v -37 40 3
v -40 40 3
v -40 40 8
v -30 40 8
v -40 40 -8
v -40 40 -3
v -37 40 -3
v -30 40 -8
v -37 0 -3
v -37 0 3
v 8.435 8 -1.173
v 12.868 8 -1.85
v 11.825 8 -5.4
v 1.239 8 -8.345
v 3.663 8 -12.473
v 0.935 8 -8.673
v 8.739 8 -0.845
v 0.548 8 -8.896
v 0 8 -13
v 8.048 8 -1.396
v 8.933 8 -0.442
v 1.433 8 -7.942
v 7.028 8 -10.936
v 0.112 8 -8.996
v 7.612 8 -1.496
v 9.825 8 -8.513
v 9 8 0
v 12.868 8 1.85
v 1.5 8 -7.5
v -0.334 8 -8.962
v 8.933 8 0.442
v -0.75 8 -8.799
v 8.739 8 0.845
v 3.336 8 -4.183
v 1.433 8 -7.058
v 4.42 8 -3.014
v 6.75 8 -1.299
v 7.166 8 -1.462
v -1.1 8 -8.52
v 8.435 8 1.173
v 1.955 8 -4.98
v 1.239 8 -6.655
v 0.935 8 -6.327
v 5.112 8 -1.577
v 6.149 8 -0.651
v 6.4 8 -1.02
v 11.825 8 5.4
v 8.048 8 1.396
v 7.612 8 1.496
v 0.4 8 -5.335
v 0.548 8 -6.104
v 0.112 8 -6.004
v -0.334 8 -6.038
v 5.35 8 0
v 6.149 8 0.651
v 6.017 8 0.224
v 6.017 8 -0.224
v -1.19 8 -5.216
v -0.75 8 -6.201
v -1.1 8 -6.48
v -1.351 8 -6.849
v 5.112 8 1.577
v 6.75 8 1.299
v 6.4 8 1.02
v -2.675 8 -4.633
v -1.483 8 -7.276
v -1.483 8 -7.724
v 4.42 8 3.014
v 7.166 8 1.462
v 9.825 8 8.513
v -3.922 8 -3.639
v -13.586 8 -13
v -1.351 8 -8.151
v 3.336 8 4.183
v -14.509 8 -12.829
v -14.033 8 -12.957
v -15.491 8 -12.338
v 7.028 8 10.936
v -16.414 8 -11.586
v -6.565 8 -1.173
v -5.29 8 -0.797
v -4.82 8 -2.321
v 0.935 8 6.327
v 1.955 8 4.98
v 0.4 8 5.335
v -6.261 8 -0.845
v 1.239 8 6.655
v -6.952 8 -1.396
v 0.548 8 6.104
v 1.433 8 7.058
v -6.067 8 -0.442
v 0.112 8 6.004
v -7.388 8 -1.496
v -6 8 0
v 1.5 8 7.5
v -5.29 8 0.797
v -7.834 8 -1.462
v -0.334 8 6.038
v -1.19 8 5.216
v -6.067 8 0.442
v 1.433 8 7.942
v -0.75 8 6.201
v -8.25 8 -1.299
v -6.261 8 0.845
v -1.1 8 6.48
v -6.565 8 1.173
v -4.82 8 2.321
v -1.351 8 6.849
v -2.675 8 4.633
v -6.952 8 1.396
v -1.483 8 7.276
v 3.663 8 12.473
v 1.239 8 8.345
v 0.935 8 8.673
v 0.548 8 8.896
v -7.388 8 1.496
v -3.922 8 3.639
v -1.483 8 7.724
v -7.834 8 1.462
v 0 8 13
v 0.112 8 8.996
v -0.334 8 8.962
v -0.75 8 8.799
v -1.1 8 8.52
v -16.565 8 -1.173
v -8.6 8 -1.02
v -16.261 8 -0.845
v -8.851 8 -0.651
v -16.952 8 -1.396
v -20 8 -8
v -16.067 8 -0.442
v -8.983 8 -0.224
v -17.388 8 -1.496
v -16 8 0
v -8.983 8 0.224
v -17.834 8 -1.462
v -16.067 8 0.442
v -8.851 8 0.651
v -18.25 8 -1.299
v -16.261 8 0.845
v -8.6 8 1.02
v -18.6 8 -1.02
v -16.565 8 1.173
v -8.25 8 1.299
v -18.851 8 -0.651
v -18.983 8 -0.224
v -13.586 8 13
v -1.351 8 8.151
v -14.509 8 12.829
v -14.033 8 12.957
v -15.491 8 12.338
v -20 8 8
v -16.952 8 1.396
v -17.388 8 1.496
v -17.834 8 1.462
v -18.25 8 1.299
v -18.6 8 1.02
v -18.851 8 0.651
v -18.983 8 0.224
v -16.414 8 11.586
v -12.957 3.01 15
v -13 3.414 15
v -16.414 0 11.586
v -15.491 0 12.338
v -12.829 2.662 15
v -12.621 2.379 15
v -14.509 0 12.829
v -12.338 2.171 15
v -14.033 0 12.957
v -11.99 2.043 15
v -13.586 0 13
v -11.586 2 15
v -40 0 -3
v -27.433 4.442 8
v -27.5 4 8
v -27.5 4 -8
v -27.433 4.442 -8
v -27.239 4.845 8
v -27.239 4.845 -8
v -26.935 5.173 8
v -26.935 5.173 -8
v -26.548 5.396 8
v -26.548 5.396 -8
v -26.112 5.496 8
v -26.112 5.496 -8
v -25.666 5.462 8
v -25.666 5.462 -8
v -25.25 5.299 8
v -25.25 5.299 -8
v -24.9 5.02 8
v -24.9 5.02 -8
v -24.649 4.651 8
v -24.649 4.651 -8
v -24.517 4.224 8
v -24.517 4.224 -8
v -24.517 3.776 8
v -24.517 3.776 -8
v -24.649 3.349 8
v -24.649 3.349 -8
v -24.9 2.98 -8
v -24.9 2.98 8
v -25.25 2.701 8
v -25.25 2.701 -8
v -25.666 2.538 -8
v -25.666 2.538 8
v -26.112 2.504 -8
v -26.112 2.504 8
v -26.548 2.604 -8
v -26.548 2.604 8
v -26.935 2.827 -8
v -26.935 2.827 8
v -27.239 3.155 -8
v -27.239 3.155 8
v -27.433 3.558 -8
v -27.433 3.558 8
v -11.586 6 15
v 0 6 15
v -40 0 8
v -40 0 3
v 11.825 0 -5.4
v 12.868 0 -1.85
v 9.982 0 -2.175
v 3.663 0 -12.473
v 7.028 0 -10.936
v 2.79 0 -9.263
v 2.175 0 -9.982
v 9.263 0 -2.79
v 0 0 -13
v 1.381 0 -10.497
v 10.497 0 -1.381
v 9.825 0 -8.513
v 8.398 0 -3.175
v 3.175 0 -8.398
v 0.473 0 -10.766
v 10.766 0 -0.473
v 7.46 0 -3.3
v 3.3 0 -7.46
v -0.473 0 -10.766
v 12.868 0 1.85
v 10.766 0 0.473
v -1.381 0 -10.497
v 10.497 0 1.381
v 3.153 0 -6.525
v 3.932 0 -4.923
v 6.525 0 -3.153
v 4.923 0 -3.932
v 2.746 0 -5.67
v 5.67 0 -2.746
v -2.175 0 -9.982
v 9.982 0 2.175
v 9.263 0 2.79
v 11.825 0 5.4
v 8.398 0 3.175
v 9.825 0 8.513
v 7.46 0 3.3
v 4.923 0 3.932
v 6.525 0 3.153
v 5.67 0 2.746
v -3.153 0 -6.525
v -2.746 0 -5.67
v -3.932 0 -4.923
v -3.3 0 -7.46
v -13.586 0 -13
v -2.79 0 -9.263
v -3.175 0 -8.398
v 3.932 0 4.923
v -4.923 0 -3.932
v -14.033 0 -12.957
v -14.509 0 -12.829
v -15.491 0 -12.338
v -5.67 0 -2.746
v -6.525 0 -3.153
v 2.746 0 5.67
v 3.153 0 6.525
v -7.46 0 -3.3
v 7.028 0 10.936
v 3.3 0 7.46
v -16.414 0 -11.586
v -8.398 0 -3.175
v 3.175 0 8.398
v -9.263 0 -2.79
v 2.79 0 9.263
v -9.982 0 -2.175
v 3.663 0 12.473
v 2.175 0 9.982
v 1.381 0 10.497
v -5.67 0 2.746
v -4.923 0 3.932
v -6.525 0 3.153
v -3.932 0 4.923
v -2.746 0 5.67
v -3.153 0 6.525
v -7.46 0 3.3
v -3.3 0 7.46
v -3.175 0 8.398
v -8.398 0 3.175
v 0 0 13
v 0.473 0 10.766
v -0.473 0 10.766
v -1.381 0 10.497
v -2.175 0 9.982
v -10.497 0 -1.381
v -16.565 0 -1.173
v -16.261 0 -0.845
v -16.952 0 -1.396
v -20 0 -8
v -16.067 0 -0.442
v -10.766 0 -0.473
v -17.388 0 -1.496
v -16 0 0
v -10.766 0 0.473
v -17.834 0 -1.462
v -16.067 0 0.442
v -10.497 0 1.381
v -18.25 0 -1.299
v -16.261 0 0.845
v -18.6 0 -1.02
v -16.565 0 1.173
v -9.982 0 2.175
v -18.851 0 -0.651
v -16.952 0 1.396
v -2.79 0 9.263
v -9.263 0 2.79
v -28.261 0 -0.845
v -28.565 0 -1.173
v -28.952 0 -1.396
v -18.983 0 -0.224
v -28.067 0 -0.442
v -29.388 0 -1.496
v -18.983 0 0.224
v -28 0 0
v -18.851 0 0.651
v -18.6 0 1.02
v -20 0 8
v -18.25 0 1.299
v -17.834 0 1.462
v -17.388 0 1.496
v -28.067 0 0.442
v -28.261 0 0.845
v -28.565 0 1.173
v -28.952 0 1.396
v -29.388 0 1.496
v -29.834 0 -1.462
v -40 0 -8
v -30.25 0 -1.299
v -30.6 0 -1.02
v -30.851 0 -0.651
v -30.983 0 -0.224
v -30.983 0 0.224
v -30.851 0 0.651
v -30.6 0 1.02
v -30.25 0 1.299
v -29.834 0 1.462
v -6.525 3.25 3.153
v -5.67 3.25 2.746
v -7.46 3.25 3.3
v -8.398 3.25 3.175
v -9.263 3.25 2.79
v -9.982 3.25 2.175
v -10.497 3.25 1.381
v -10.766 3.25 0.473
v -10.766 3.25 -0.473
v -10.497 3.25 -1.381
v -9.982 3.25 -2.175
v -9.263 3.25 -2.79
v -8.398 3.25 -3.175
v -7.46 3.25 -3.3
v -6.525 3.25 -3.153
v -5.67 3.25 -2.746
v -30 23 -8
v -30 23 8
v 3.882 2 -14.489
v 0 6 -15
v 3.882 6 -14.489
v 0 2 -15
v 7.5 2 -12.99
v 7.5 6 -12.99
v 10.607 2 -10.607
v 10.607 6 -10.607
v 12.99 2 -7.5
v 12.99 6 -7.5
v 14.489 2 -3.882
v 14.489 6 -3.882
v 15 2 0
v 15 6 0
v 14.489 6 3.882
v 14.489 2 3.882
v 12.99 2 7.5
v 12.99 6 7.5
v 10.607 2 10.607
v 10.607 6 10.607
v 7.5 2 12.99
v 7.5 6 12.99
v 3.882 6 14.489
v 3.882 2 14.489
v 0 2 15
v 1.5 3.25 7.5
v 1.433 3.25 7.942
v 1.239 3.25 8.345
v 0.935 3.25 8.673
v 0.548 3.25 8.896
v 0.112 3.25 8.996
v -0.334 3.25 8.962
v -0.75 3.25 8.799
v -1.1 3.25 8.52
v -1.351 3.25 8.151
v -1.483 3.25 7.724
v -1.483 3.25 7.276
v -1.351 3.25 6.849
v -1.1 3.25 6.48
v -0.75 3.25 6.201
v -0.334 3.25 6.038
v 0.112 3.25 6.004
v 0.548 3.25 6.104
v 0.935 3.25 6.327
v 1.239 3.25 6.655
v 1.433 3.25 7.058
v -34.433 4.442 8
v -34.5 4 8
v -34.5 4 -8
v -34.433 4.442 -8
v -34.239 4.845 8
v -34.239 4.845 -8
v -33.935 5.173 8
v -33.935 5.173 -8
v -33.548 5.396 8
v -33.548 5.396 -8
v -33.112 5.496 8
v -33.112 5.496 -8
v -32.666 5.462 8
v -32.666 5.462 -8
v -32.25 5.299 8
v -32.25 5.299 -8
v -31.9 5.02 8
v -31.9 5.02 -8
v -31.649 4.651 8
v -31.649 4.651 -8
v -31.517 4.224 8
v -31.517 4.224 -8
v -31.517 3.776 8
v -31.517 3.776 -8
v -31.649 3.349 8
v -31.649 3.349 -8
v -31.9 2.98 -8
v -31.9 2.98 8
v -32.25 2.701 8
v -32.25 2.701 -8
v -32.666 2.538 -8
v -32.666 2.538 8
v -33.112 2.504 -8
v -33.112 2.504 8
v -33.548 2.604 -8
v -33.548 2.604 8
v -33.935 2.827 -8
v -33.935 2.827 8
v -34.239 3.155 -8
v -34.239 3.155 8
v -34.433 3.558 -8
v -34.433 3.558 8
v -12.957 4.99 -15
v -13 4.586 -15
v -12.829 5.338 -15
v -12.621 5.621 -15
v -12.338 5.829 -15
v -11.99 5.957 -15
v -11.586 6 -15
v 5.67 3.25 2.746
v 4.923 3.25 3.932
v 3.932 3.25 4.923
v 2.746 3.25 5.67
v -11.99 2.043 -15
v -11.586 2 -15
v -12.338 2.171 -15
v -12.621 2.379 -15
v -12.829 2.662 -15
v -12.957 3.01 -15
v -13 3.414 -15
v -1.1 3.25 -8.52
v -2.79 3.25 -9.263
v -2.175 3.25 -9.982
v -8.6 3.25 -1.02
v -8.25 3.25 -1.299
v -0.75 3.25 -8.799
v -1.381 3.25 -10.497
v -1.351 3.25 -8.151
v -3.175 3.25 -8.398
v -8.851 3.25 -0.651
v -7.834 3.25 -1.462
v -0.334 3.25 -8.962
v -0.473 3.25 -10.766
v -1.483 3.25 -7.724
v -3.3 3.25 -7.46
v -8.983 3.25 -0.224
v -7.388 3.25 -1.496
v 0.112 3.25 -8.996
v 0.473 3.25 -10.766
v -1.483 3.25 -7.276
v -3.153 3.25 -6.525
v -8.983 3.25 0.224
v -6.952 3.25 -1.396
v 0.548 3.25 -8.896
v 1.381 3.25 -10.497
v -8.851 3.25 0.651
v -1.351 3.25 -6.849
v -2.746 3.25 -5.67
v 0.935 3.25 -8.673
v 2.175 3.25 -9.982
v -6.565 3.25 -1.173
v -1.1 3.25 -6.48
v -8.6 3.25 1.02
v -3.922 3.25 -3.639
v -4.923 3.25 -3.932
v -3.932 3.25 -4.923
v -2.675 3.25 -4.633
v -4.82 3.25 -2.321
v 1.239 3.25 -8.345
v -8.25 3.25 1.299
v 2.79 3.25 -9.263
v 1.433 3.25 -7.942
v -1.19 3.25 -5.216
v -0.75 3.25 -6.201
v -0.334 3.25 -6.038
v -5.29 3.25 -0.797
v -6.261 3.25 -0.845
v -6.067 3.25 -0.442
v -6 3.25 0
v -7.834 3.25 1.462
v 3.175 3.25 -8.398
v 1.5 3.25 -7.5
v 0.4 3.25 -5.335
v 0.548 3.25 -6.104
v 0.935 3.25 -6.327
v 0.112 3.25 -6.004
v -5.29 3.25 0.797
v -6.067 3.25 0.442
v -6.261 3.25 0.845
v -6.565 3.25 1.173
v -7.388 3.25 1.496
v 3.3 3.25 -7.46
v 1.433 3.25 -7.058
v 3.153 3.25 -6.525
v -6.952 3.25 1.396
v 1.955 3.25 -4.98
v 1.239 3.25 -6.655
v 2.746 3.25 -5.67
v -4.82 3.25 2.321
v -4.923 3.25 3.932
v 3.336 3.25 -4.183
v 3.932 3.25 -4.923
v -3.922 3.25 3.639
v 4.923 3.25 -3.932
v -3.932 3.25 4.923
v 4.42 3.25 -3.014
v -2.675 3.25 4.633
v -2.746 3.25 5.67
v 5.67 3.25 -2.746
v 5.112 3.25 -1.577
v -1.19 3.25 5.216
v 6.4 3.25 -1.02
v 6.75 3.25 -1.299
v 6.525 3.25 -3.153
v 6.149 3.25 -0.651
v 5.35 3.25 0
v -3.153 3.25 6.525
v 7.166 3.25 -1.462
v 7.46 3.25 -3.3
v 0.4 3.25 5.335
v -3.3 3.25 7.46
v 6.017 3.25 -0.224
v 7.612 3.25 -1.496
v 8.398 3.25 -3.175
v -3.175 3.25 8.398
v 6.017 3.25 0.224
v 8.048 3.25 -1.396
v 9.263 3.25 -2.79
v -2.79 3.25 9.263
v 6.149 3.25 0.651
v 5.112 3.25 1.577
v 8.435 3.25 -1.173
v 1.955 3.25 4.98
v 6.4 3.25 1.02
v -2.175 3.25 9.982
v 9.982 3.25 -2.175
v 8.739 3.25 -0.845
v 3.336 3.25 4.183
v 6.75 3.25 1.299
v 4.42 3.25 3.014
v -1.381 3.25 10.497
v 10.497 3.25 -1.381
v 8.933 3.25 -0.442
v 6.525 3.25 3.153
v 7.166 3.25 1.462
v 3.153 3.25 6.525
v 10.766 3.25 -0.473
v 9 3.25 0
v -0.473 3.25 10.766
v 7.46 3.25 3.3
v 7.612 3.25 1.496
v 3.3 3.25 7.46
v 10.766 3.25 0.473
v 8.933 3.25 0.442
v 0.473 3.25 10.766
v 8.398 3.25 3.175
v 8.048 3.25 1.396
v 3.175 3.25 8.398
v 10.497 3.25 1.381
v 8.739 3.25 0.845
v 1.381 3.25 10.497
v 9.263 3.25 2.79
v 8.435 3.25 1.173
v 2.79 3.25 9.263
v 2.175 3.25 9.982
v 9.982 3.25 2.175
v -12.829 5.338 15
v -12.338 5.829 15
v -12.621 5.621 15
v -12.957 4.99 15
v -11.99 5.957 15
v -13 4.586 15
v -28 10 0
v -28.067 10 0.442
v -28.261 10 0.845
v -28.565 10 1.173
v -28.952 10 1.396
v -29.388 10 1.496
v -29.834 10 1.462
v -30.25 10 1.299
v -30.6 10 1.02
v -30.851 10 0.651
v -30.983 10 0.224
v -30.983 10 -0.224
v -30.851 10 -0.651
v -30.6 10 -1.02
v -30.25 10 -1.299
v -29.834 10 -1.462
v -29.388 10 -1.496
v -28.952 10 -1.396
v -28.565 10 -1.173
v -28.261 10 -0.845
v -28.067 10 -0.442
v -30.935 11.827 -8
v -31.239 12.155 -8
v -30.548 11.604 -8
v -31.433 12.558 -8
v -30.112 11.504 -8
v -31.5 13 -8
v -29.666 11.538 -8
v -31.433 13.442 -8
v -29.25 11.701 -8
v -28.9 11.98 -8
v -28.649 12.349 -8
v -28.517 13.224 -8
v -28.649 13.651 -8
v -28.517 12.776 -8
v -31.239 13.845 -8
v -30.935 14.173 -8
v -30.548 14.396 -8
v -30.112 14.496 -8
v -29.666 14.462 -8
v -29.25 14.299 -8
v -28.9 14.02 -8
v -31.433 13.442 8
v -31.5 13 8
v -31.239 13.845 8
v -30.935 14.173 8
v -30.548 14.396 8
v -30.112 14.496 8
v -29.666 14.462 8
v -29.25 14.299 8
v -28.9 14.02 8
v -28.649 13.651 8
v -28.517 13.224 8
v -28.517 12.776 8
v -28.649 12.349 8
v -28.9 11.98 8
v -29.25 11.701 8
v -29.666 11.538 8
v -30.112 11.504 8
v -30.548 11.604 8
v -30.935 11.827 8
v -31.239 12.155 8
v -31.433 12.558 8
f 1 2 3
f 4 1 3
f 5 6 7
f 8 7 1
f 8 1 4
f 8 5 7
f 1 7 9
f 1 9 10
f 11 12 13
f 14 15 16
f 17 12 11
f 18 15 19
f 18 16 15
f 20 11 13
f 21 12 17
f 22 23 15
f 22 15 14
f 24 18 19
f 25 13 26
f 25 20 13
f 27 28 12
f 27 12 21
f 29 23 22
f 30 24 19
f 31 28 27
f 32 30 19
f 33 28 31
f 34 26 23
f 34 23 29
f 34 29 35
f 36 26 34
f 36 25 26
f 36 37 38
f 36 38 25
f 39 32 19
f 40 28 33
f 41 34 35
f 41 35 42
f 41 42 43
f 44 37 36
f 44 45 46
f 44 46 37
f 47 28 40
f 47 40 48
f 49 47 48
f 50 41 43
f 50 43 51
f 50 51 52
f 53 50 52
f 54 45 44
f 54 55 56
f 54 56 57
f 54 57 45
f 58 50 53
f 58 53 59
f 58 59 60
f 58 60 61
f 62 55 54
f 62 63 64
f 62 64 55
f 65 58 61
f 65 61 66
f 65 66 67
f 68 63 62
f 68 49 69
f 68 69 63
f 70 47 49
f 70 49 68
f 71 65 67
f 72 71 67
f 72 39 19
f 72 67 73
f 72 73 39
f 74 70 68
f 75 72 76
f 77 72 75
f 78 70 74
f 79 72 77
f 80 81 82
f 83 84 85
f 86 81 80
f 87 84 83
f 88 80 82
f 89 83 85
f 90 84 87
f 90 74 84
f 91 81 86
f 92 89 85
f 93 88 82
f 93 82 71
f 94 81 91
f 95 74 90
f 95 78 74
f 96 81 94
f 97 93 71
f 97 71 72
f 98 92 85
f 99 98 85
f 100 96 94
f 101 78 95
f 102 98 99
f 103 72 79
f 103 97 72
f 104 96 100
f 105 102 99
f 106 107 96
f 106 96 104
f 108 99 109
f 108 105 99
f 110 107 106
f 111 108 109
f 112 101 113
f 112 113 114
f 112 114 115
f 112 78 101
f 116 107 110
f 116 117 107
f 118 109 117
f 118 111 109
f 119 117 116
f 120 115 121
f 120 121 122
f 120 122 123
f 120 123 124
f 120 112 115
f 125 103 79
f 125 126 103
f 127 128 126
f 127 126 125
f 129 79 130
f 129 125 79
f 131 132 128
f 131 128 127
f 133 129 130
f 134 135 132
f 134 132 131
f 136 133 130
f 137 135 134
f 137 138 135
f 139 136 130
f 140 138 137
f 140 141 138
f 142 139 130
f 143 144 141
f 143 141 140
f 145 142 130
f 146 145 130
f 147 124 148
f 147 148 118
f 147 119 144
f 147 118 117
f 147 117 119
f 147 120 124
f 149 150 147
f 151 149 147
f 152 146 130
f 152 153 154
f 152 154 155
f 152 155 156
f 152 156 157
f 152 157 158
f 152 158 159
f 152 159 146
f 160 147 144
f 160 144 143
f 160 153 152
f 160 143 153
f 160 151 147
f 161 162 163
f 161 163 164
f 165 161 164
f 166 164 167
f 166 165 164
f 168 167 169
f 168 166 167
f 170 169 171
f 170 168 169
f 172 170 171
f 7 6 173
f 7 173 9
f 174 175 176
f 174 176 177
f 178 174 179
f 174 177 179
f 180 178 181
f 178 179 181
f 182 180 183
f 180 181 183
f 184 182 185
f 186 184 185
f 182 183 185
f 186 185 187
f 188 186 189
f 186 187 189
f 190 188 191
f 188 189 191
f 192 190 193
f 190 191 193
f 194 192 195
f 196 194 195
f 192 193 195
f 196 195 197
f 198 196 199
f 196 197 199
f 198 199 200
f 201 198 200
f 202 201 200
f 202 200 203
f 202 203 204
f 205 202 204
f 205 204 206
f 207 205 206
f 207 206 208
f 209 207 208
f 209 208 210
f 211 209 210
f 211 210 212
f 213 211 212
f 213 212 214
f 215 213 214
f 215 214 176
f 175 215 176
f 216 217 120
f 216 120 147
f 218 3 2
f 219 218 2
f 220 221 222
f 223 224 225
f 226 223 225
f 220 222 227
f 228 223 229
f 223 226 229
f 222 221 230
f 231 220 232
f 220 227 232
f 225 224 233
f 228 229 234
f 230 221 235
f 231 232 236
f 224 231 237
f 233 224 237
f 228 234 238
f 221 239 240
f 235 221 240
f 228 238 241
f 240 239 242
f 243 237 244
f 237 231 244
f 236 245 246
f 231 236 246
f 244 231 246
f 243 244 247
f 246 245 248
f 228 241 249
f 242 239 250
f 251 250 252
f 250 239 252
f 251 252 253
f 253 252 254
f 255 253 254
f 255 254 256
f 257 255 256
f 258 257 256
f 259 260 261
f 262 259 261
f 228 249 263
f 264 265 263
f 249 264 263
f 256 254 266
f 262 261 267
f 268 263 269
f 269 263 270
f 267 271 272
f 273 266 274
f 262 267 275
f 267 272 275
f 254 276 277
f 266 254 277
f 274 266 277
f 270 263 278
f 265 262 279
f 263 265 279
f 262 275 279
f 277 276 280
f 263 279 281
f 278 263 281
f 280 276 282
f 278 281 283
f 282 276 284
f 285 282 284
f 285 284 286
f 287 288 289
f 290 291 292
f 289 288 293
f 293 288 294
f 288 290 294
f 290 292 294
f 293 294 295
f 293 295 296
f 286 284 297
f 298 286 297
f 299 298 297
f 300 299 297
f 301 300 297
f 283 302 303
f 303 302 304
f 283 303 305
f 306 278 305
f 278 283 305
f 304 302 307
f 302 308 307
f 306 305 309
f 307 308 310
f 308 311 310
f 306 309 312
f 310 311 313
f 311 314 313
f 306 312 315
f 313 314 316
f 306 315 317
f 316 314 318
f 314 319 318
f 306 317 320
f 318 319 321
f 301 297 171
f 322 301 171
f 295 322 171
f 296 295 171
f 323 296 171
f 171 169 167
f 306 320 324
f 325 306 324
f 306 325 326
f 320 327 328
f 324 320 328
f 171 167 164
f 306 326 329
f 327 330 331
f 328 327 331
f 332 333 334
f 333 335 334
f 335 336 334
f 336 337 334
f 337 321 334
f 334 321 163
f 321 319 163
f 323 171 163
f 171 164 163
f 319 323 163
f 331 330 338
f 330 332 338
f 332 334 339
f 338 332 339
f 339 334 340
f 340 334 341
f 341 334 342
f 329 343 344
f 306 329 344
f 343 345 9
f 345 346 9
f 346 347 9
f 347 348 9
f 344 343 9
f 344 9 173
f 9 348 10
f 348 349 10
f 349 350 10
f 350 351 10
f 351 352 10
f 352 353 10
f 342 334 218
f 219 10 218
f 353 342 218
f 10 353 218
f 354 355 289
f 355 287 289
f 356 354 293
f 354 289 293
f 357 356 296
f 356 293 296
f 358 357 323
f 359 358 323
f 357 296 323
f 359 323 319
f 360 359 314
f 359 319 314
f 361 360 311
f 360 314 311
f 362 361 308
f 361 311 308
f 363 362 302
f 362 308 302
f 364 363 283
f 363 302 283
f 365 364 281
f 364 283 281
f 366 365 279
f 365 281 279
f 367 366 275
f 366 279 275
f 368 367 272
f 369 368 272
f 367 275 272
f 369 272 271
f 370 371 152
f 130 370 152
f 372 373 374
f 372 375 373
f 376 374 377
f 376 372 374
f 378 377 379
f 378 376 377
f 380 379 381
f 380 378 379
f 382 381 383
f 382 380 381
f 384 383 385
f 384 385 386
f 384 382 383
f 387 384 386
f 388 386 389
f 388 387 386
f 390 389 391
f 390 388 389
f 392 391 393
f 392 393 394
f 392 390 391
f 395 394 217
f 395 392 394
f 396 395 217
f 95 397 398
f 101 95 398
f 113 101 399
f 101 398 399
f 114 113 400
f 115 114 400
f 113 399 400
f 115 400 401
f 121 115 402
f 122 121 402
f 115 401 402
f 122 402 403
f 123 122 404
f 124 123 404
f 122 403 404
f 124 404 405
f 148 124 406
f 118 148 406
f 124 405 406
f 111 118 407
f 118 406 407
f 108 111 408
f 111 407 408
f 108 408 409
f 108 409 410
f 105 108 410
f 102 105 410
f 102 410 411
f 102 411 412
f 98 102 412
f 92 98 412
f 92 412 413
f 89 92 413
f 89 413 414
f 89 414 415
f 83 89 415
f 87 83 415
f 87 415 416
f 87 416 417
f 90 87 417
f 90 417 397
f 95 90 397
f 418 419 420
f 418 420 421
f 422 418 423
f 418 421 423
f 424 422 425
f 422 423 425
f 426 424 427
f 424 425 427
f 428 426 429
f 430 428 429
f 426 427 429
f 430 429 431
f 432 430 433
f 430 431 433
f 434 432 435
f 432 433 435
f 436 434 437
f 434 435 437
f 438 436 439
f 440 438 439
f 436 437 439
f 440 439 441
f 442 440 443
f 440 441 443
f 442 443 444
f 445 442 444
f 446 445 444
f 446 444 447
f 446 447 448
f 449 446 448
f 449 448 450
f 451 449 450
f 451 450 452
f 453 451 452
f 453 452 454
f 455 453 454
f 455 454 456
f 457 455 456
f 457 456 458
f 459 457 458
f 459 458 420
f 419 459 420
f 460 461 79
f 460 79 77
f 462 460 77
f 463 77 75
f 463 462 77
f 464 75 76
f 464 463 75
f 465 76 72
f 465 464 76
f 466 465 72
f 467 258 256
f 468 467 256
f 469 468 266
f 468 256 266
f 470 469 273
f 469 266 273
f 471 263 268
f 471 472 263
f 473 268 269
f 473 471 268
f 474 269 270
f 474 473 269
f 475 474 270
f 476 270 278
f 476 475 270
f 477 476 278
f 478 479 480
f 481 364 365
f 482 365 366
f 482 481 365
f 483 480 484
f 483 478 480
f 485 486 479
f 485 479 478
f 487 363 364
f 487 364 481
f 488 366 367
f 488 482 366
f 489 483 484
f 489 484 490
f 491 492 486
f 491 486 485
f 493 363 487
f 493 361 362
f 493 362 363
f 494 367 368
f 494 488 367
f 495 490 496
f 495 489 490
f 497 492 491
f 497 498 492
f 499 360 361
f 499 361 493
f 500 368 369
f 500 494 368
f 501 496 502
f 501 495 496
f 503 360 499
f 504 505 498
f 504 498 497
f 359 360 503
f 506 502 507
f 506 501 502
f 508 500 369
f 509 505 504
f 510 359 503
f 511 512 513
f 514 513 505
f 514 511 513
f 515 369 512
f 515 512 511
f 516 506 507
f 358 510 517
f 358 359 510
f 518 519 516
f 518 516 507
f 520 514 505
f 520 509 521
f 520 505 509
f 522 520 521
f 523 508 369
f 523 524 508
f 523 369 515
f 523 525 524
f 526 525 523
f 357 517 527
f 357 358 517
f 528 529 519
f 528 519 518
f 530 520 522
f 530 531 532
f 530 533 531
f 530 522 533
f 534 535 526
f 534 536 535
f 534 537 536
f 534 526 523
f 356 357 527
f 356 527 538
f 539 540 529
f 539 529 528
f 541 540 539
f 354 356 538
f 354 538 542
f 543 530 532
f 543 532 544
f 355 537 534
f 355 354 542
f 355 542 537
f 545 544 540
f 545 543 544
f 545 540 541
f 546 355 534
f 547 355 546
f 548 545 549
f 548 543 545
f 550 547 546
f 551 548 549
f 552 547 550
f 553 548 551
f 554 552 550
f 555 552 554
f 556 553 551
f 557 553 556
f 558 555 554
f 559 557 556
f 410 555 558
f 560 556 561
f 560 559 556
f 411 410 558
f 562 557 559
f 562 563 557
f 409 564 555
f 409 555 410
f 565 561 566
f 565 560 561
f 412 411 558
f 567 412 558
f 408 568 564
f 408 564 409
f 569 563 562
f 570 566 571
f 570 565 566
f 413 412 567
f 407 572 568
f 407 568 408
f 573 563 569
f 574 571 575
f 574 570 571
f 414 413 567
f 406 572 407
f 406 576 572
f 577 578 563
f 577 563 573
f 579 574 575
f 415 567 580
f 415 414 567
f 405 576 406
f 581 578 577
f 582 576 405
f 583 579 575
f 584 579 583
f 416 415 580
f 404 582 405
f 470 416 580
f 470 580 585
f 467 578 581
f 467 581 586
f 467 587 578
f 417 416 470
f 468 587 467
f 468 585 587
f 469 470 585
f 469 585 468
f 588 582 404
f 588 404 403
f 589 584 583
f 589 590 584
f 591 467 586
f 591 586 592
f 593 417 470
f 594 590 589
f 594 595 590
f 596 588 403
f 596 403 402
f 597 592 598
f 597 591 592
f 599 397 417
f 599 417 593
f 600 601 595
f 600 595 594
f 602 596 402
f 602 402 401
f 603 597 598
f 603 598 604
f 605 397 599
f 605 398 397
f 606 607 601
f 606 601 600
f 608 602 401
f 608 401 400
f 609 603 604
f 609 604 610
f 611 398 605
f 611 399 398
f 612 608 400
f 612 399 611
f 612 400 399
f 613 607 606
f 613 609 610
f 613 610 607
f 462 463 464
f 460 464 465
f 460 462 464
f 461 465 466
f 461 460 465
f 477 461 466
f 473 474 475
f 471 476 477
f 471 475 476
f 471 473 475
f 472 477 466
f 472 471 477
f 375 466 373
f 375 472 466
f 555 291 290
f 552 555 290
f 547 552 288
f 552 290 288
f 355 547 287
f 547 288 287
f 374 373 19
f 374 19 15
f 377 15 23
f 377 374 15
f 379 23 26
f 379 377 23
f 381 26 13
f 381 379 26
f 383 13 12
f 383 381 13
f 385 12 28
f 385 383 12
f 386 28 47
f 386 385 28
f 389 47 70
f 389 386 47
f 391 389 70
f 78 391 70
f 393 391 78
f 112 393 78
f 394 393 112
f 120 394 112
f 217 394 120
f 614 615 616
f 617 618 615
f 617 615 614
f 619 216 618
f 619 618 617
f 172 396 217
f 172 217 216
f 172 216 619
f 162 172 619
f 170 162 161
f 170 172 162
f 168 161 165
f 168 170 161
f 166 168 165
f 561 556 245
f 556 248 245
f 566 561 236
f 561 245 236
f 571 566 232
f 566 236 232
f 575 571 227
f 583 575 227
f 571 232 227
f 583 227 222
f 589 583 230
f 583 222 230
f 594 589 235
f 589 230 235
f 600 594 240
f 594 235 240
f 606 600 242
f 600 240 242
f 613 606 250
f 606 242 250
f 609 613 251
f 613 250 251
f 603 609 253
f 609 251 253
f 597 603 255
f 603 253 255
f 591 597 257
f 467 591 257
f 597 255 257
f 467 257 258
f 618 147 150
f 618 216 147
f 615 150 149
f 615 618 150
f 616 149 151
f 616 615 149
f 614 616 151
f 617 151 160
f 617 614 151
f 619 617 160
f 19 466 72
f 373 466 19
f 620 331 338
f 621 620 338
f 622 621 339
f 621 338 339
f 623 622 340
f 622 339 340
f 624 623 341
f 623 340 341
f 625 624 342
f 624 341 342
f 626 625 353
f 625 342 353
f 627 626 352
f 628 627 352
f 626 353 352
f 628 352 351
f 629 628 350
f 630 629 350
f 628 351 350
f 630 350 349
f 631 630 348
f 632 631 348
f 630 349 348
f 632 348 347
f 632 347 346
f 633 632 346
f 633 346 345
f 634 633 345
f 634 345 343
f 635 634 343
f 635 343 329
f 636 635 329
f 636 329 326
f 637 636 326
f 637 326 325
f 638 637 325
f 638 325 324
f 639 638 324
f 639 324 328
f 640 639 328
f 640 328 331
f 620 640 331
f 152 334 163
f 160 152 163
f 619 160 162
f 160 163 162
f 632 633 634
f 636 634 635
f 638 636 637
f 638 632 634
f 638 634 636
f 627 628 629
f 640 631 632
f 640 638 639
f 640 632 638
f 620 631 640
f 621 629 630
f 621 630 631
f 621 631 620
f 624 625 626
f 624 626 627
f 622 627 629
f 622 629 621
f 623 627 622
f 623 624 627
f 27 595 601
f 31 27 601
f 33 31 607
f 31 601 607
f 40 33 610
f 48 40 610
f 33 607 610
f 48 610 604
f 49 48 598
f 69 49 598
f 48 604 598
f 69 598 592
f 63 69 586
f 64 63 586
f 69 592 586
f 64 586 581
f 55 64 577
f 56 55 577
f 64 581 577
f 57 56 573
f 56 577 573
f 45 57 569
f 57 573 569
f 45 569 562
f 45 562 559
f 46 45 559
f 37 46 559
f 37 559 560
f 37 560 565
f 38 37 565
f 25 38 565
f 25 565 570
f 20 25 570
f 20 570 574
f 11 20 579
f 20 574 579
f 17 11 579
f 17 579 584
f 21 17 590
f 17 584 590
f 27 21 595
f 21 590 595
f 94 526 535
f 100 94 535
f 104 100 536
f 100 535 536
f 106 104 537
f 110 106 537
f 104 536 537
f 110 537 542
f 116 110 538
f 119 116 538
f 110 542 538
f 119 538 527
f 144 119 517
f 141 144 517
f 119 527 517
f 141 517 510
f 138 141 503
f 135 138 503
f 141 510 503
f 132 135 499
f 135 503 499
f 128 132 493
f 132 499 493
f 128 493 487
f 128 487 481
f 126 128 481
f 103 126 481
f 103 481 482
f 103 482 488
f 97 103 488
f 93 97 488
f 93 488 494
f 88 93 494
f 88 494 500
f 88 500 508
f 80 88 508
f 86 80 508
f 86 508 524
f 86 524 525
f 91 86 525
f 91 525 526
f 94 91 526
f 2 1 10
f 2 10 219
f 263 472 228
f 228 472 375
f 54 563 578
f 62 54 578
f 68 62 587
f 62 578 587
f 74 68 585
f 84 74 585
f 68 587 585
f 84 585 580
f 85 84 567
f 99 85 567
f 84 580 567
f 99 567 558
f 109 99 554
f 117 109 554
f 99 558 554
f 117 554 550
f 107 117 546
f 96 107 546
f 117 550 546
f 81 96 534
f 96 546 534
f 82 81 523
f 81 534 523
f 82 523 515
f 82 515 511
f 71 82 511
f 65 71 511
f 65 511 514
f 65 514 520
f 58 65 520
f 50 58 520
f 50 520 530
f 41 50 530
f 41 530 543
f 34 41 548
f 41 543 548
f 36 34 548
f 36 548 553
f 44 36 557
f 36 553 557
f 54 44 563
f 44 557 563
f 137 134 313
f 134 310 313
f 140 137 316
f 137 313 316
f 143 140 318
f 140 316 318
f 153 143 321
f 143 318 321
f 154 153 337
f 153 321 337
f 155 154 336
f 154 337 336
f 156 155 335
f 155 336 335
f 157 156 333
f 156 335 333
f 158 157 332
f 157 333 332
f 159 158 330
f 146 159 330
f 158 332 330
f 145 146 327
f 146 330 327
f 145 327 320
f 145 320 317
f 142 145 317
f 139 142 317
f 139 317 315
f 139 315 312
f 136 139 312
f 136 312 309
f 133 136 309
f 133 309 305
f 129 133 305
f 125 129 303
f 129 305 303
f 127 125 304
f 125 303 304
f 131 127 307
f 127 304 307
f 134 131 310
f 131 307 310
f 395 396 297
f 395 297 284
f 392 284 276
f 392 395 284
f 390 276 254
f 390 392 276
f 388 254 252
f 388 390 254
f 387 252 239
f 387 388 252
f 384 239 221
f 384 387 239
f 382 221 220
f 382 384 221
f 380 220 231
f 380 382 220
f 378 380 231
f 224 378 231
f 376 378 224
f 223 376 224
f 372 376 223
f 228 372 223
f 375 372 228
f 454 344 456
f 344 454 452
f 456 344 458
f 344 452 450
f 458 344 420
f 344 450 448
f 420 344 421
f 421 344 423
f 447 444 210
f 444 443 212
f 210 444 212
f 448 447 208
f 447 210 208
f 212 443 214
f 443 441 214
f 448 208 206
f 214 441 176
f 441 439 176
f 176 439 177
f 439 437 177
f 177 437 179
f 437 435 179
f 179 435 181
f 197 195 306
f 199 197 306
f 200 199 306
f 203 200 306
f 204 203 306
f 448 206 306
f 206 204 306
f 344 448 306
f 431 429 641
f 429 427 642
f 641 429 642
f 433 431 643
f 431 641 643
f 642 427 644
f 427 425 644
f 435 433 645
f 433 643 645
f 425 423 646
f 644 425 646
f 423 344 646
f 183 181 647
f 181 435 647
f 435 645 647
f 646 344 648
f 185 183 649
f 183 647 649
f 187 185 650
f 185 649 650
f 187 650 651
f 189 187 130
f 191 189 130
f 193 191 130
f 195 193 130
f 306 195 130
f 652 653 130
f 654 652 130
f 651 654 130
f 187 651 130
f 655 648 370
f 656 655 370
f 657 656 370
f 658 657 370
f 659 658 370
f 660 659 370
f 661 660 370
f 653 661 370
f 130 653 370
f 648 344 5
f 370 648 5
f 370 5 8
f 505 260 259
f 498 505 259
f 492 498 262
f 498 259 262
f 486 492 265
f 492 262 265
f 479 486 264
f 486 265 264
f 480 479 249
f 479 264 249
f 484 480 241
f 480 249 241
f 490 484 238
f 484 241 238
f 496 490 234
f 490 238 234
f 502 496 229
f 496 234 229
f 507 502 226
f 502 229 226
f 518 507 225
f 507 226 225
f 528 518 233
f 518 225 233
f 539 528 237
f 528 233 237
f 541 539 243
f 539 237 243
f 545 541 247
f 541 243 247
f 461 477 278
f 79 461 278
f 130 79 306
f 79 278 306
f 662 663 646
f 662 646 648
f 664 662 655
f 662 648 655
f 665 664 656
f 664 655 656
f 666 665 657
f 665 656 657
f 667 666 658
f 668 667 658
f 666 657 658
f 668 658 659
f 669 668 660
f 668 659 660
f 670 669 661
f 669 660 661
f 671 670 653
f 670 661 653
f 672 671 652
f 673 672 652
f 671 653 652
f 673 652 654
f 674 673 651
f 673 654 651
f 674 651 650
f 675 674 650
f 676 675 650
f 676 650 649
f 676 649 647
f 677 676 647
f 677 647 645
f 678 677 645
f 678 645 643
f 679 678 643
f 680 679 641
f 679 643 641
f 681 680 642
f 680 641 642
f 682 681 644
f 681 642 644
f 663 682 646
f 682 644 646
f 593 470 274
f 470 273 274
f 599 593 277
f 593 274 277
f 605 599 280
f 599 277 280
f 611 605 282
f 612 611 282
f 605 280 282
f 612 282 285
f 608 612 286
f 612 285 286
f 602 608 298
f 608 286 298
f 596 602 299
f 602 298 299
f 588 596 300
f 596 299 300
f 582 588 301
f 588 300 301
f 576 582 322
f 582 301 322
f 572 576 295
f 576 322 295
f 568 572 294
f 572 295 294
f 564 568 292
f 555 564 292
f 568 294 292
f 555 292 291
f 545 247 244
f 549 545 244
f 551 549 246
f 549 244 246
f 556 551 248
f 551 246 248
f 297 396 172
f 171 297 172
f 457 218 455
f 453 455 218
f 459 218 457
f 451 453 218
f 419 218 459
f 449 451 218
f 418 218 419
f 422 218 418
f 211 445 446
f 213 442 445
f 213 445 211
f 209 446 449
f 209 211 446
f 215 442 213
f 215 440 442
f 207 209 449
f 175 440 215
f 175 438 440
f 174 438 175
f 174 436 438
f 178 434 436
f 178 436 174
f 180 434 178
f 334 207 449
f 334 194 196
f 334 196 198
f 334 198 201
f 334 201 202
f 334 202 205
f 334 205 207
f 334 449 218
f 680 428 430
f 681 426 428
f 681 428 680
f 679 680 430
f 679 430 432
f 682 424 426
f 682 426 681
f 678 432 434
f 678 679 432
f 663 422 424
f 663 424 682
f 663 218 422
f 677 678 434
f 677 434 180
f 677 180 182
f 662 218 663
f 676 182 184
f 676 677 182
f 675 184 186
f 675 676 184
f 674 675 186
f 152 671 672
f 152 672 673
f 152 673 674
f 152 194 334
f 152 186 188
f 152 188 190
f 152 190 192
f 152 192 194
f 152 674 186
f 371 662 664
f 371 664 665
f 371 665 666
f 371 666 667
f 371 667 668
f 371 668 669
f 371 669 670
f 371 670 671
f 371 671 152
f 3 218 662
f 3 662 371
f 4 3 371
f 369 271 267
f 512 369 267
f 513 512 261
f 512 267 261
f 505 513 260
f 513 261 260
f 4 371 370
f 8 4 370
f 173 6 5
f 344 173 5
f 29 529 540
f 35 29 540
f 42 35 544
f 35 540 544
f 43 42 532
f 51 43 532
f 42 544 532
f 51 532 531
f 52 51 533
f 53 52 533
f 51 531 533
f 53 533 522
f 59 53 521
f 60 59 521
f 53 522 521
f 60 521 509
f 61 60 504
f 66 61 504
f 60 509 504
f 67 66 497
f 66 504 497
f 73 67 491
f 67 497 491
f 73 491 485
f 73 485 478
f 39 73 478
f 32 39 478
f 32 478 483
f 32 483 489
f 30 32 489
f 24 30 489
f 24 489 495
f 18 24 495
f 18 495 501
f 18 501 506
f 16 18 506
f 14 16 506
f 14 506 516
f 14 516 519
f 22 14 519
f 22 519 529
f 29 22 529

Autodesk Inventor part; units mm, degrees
ref_plane "YZ Plane" through (0, 0, 0) normal (1, 0, 0) x (0, 1, 0)
ref_plane "XZ Plane" through (0, 0, 0) normal (0, 1, 0) x (-1, 0, 0)
sketch "Sketch1" plane through (0, 0, 0) normal (0, 1, 0) x (-1, 0, 0)
  circle A0 centre (0, 0) radius 15
  line L0 (0, 0) -> (0, 15)
  line L1 (0, 15) -> (40, 15)
  line L2 (40, 15) -> (40, -15)
  line L3 (40, -15) -> (0, -15)
  line L4 (0, -15) -> (0, 15)
  dimension "d0" = 30
  dimension "d1" = 15
  dimension "d2" = 40
  dimension "d3" = 30
extrude "Extrusion1" add sketch "Sketch1" along normal blind 8
sketch "Sketch2" plane through (-40, 0, -15) normal (-1, 0, 0) x (0, 0, 1)
  line L0 (0, 0) -> (30, 0) projected
  line L1 (30, 0) -> (30, 8) projected
  line L2 (0, 8) -> (30, 8) projected
  line L3 (0, 0) -> (0, 8) projected
  line L4 (0, 0) -> (30, 0) projected
  line L5 (0, 0) -> (30, 0)
  line L6 (30, 0) -> (30, 40)
  line L7 (30, 40) -> (0, 40)
  line L8 (0, 40) -> (0, 0)
  point P0 (15, 0)
  dimension "d6" = 30
  dimension "d7" = 40
extrude "Extrusion2" add sketch "Sketch2" against normal blind 5
sketch "Sketch3" plane through (-40, 40, 15) normal (0, 1, 0) x (1, 0, 0)
  line L0 (0, 0) -> (0, 30) projected
  line L1 (0, 0) -> (5, 0) projected
  line L2 (5, 30) -> (5, 0) projected
  line L3 (0, 30) -> (5, 30) projected
  line L4 (3, 18) -> (3, 12)
  line L5 (3, 12) -> (-3, 12)
  line L6 (-3, 12) -> (-3, 18)
  line L7 (-3, 18) -> (3, 18)
  line L8 (0, 30) -> (0, 0) projected
  line L9 (3, 18) -> (-3, 12) construction
  line L10 (3, 12) -> (-3, 18) construction
  point P0 (40, 15)
  point P1 (0, 15)
  dimension "d10" = 6
  dimension "d11" = 6
extrude "Extrusion3" cut sketch "Sketch3" against normal up to surface (40 mm away) contours L5 L6 L7 L0 | L0 L7 L4 L5
sketch "Sketch4" plane through (0, 0, 0) normal (0, -1, 0) x (1, 0, 0)
  circle A0 centre (0, 0) radius 5.35
  dimension "d14" = 10.7
extrude "Extrusion4" cut sketch "Sketch4" against normal blind 8
sketch "Sketch5" plane through (0, 0, 0) normal (0, -1, 0) x (1, 0, 0)
  circle A0 centre (0, 0) radius 5.35 projected
  line L0 (-37, -3) -> (-40, -3) projected
  line L1 (-40, -15) -> (-40, -3) projected
  line L2 (0, -15) -> (-40, -15) projected
  arc A1 (0, -15) -> (0, 15) centre (0, 0) ccw projected
  line L3 (-40, 15) -> (0, 15) projected
  line L4 (-40, 3) -> (-40, 15) projected
  line L5 (-40, 3) -> (-37, 3) projected
  line L6 (-37, 3) -> (-37, -3) projected
  line L7 (-40, -15) -> (-20, -15)
  line L8 (-20, -15) -> (-20, -8)
  line L9 (-20, -8) -> (-40, -8)
  line L10 (-40, -8) -> (-40, -15)
  line L11 (-40, 15) -> (0, 15) projected
  line L12 (-40, 15) -> (-20, 15)
  line L13 (-20, 15) -> (-20, 8)
  line L14 (-20, 8) -> (-40, 8)
  line L15 (-40, 8) -> (-40, 15)
  line L16 (-20, -8) -> (-13, -8)
  line L17 (-13, -8) -> (-13, -15)
  line L18 (-13, -15) -> (-20, -15)
  line L19 (-20, -15) -> (-20, -8)
  line L20 (-20, 8) -> (-13, 8)
  line L21 (-13, 8) -> (-13, 15)
  line L22 (-13, 15) -> (-20, 15)
  line L23 (-20, 15) -> (-20, 8)
  line L24 (-13, -15) -> (-20, -8)
  line L25 (-20, 8) -> (-13, 15)
  dimension "d17" = 20
  dimension "d18" = 7
  dimension "d19" = 20
  dimension "d20" = 7
  dimension "d21" = 7
  dimension "d22" = 7
  dimension "d23" = 7
  dimension "d24" = 7
extrude "Extrusion5" cut sketch "Sketch5" against normal up to surface (40 mm away) contours L9 L8 L2 L1 | L24 L2 L8 | L4 L3 L13 L14 | L13 L3 L25
sketch "Sketch6" plane through (0, 8, 0) normal (0, 1, 0) x (1, 0, 0)
  line L0 (-20, -8) -> (-13, -15) projected
  line L1 (-13, -15) -> (0, -15) projected
  arc A0 (0, -15) -> (0, 15) centre (0, 0) ccw projected
  line L2 (0, 15) -> (-13, 15) projected
  line L3 (-13, 15) -> (-20, 8) projected
  line L4 (-20, 8) -> (-35, 8) projected
  line L5 (-35, 8) -> (-35, -8) projected
  line L6 (-35, -8) -> (-20, -8) projected
  circle A1 centre (0, 0) radius 5.35 projected
  line L7 (-35, 8) -> (-35, -8) projected
  line L8 (-35, -8) -> (-30, -8)
  line L9 (-30, -8) -> (-30, 8)
  line L10 (-30, 8) -> (-35, 8)
  line L11 (-35, 8) -> (-35, -8)
  dimension "d27" = 5
  dimension "d28" = 16
extrude "Extrusion6" add sketch "Sketch6" along normal up to surface (32 mm away) contours L6 L5 L4 L9
sketch "Sketch8" plane through (-40, 0, 8) normal (0, 0, 1) x (1, 0, 0)
  line L0 (10, 8) -> (10, 40) projected
  line L1 (0, 40) -> (10, 40) projected
  line L2 (0, 0) -> (0, 40) projected
  line L3 (20, 0) -> (0, 0) projected
  line L4 (20, 0) -> (20, 8) projected
  line L5 (10, 8) -> (20, 8) projected
  line L6 (10, 8) -> (10, 40) projected
  line L7 (10, 8) -> (10, 23)
  line L8 (10, 23) -> (20, 8)
  point P0 (40, 0)
  dimension "d34" = 15
extrude "Extrusion8" add sketch "Sketch8" against normal up to surface (16 mm away) contours L0 L8 L5
sketch "Sketch9" plane through (-20, 0, -8) normal (0, 0, -1) x (-1, 0, 0)
  line L0 (0, 0) -> (0, 8) projected
  line L1 (20, 0) -> (0, 0) projected
  line L2 (20, 40) -> (20, 0) projected
  line L3 (10, 40) -> (20, 40) projected
  line L4 (10, 23) -> (10, 40) projected
  line L5 (10, 23) -> (0, 8) projected
  line L6 (20, 0) -> (0, 0) projected
  line L7 (0, 0) -> (0, 4)
  line L8 (0, 0) -> (0, 8) projected
  line L9 (0, 4) -> (6, 4)
  line L10 (6, 4) -> (13, 4)
  circle A0 centre (6, 4) radius 1.5
  circle A1 centre (13, 4) radius 1.5
  line L11 (13, 4) -> (13, 13)
  line L12 (13, 13) -> (10, 13)
  circle A2 centre (10, 13) radius 1.5
  point P0 (-20, 0)
  dimension "d37" = 4
  dimension "d38" = 6
  dimension "d39" = 7
  dimension "d40" = 3
  dimension "d41" = 3
  dimension "d42" = 9
  dimension "d43" = 3
  dimension "d44" = 3
extrude "Extrusion9" cut sketch "Sketch9" against normal up to surface (16 mm away) contours A0 L10 L9 | L9 L10 A0 | A1 L11 L10 | L10 L11 A1 | A2
sketch "Sketch10" plane through (0, 0, 0) normal (0, -1, 0) x (1, 0, 0)
  point P0 (0, 0)
sketch "Sketch11" plane through (0, 0, 0) normal (0, -1, 0) x (1, 0, 0)
  circle A0 centre (0, 0) radius 5.35 projected
  line L0 (-13, 15) -> (-20, 8) projected
  line L1 (-20, 8) -> (-40, 8) projected
  line L2 (-40, 3) -> (-40, 8) projected
  line L3 (-40, 3) -> (-37, 3) projected
  line L4 (-37, 3) -> (-37, -3) projected
  line L5 (-37, -3) -> (-40, -3) projected
  line L6 (-40, -8) -> (-40, -3) projected
  line L7 (-40, -8) -> (-20, -8) projected
  line L8 (-20, -8) -> (-13, -15) projected
  line L9 (0, -15) -> (-13, -15) projected
  arc A1 (0, -15) -> (0, 15) centre (0, 0) ccw projected
  line L10 (-13, 15) -> (0, 15) projected
  line L11 (0, 0) -> (7.5, 0)
  circle A2 centre (7.5, 0) radius 1.5
  circle A3 centre (0, 7.5) radius 1.5
  circle A4 centre (-7.5, 0) radius 1.5
  circle A5 centre (0, -7.5) radius 1.5
  dimension "d47" = 7.5
  dimension "d48" = 3
  dimension "d51" = 360
extrude "Extrusion10" cut sketch "Sketch11" against normal blind 10 contours A2 | A3 | A4 | A5
sketch "Sketch12" plane through (0, 0, 0) normal (0, -1, 0) x (1, 0, 0)
  point P0 (0, 0)
sketch "Sketch13" plane through (0, 0, 0) normal (0, -1, 0) x (1, 0, 0)
  arc A0 (-2.2798, -5.55) -> (2.2798, -5.55) centre (0, -7.5) ccw projected
  arc A1 (-5.55, -2.2798) -> (-2.2798, -5.55) centre (0, 0) ccw projected
  arc A2 (-5.55, 2.2798) -> (-5.55, -2.2798) centre (-7.5, 0) ccw projected
  arc A3 (-2.2798, 5.55) -> (-5.55, 2.2798) centre (0, 0) ccw projected
  arc A4 (2.2798, 5.55) -> (-2.2798, 5.55) centre (0, 7.5) ccw projected
  arc A5 (5.55, 2.2798) -> (2.2798, 5.55) centre (0, 0) ccw projected
  arc A6 (5.55, -2.2798) -> (5.55, 2.2798) centre (7.5, 0) ccw projected
  arc A7 (2.2798, -5.55) -> (5.55, -2.2798) centre (0, 0) ccw projected
  point P0 (0, 0)
ref_plane "Work Plane1" through (-10.5, 3.25, -10.5) normal (0, 1, 0) x (0, 0, 1)
extrude "Extrusion11" cut sketch "Sketch13" against normal up to surface (3.25 mm away)
thicken "Thicken1" operation add thickness 0.3 both sides no extend neighbours yes toward (0.8094149, 0, 0.5872372) faces at (2.4282, 2.1667, -5.7383) (-4.513, 2.1667, -3.9539) (-7.296, 2.1667, -2.9931) (-4.7637, 2.1667, 3.6479) (-2.4282, 2.1667, 5.7383) (5.3877, 1.0833, 2.6405) (7.296, 2.1667, 2.9931) (4.7637, 2.1667, -3.6479)
sketch "Sketch14" plane through (0, 0, 0) normal (0, -1, 0) x (1, 0, 0)
  arc A0 (5.67, -2.7461) -> (5.67, 2.7461) centre (7.5, 0) ccw projected
  arc A1 (2.7461, -5.67) -> (5.67, -2.7461) centre (0, 0) ccw projected
  arc A2 (-2.7461, -5.67) -> (2.7461, -5.67) centre (0, -7.5) ccw projected
  arc A3 (-5.67, -2.7461) -> (-2.7461, -5.67) centre (0, 0) ccw projected
  arc A4 (-5.67, 2.7461) -> (-5.67, -2.7461) centre (-7.5, 0) ccw projected
  arc A5 (-2.7461, 5.67) -> (-5.67, 2.7461) centre (0, 0) ccw projected
  arc A6 (2.7461, 5.67) -> (-2.7461, 5.67) centre (0, 7.5) ccw projected
  arc A7 (5.67, 2.7461) -> (2.7461, 5.67) centre (0, 0) ccw projected
  line L0 (-13, 15) -> (-20, 8) projected
  line L1 (-20, 8) -> (-40, 8) projected
  line L2 (-40, 3) -> (-40, 8) projected
  line L3 (-40, 3) -> (-37, 3) projected
  line L4 (-37, 3) -> (-37, -3) projected
  line L5 (-37, -3) -> (-40, -3) projected
  line L6 (-40, -8) -> (-40, -3) projected
  line L7 (-40, -8) -> (-20, -8) projected
  line L8 (-20, -8) -> (-13, -15) projected
  line L9 (0, -15) -> (-13, -15) projected
  arc A8 (0, -15) -> (0, 15) centre (0, 0) ccw projected
  line L10 (-13, 15) -> (0, 15) projected
  line L11 (-37, 0) -> (-29.5, 0)
  circle A9 centre (-29.5, 0) radius 1.5
  line L12 (-29.5, 0) -> (-17.5, 0)
  circle A10 centre (-17.5, 0) radius 1.5
  dimension "d59" = 7.5
  dimension "d60" = 3
  dimension "d61" = 12
  dimension "d62" = 3
extrude "Extrusion12" cut sketch "Sketch14" against normal blind 10 contours A9 L12 L11 | L11 L12 A9 | A10
chamfer "Chamfer1" distance 2 angle 45 6 edges at (-6.5, 0, -15) (15, 0, 0) (-6.5, 0, 15) (15, 8, 0) (-6.5, 8, -15) (-6.5, 8, 15)
fillet "Fillet1" radius 2 4 edges at (-14, 1, -14) (-14, 7, -14) (-14, 1, 14) (-14, 7, 14)
properties part number "dog_bone_3"
